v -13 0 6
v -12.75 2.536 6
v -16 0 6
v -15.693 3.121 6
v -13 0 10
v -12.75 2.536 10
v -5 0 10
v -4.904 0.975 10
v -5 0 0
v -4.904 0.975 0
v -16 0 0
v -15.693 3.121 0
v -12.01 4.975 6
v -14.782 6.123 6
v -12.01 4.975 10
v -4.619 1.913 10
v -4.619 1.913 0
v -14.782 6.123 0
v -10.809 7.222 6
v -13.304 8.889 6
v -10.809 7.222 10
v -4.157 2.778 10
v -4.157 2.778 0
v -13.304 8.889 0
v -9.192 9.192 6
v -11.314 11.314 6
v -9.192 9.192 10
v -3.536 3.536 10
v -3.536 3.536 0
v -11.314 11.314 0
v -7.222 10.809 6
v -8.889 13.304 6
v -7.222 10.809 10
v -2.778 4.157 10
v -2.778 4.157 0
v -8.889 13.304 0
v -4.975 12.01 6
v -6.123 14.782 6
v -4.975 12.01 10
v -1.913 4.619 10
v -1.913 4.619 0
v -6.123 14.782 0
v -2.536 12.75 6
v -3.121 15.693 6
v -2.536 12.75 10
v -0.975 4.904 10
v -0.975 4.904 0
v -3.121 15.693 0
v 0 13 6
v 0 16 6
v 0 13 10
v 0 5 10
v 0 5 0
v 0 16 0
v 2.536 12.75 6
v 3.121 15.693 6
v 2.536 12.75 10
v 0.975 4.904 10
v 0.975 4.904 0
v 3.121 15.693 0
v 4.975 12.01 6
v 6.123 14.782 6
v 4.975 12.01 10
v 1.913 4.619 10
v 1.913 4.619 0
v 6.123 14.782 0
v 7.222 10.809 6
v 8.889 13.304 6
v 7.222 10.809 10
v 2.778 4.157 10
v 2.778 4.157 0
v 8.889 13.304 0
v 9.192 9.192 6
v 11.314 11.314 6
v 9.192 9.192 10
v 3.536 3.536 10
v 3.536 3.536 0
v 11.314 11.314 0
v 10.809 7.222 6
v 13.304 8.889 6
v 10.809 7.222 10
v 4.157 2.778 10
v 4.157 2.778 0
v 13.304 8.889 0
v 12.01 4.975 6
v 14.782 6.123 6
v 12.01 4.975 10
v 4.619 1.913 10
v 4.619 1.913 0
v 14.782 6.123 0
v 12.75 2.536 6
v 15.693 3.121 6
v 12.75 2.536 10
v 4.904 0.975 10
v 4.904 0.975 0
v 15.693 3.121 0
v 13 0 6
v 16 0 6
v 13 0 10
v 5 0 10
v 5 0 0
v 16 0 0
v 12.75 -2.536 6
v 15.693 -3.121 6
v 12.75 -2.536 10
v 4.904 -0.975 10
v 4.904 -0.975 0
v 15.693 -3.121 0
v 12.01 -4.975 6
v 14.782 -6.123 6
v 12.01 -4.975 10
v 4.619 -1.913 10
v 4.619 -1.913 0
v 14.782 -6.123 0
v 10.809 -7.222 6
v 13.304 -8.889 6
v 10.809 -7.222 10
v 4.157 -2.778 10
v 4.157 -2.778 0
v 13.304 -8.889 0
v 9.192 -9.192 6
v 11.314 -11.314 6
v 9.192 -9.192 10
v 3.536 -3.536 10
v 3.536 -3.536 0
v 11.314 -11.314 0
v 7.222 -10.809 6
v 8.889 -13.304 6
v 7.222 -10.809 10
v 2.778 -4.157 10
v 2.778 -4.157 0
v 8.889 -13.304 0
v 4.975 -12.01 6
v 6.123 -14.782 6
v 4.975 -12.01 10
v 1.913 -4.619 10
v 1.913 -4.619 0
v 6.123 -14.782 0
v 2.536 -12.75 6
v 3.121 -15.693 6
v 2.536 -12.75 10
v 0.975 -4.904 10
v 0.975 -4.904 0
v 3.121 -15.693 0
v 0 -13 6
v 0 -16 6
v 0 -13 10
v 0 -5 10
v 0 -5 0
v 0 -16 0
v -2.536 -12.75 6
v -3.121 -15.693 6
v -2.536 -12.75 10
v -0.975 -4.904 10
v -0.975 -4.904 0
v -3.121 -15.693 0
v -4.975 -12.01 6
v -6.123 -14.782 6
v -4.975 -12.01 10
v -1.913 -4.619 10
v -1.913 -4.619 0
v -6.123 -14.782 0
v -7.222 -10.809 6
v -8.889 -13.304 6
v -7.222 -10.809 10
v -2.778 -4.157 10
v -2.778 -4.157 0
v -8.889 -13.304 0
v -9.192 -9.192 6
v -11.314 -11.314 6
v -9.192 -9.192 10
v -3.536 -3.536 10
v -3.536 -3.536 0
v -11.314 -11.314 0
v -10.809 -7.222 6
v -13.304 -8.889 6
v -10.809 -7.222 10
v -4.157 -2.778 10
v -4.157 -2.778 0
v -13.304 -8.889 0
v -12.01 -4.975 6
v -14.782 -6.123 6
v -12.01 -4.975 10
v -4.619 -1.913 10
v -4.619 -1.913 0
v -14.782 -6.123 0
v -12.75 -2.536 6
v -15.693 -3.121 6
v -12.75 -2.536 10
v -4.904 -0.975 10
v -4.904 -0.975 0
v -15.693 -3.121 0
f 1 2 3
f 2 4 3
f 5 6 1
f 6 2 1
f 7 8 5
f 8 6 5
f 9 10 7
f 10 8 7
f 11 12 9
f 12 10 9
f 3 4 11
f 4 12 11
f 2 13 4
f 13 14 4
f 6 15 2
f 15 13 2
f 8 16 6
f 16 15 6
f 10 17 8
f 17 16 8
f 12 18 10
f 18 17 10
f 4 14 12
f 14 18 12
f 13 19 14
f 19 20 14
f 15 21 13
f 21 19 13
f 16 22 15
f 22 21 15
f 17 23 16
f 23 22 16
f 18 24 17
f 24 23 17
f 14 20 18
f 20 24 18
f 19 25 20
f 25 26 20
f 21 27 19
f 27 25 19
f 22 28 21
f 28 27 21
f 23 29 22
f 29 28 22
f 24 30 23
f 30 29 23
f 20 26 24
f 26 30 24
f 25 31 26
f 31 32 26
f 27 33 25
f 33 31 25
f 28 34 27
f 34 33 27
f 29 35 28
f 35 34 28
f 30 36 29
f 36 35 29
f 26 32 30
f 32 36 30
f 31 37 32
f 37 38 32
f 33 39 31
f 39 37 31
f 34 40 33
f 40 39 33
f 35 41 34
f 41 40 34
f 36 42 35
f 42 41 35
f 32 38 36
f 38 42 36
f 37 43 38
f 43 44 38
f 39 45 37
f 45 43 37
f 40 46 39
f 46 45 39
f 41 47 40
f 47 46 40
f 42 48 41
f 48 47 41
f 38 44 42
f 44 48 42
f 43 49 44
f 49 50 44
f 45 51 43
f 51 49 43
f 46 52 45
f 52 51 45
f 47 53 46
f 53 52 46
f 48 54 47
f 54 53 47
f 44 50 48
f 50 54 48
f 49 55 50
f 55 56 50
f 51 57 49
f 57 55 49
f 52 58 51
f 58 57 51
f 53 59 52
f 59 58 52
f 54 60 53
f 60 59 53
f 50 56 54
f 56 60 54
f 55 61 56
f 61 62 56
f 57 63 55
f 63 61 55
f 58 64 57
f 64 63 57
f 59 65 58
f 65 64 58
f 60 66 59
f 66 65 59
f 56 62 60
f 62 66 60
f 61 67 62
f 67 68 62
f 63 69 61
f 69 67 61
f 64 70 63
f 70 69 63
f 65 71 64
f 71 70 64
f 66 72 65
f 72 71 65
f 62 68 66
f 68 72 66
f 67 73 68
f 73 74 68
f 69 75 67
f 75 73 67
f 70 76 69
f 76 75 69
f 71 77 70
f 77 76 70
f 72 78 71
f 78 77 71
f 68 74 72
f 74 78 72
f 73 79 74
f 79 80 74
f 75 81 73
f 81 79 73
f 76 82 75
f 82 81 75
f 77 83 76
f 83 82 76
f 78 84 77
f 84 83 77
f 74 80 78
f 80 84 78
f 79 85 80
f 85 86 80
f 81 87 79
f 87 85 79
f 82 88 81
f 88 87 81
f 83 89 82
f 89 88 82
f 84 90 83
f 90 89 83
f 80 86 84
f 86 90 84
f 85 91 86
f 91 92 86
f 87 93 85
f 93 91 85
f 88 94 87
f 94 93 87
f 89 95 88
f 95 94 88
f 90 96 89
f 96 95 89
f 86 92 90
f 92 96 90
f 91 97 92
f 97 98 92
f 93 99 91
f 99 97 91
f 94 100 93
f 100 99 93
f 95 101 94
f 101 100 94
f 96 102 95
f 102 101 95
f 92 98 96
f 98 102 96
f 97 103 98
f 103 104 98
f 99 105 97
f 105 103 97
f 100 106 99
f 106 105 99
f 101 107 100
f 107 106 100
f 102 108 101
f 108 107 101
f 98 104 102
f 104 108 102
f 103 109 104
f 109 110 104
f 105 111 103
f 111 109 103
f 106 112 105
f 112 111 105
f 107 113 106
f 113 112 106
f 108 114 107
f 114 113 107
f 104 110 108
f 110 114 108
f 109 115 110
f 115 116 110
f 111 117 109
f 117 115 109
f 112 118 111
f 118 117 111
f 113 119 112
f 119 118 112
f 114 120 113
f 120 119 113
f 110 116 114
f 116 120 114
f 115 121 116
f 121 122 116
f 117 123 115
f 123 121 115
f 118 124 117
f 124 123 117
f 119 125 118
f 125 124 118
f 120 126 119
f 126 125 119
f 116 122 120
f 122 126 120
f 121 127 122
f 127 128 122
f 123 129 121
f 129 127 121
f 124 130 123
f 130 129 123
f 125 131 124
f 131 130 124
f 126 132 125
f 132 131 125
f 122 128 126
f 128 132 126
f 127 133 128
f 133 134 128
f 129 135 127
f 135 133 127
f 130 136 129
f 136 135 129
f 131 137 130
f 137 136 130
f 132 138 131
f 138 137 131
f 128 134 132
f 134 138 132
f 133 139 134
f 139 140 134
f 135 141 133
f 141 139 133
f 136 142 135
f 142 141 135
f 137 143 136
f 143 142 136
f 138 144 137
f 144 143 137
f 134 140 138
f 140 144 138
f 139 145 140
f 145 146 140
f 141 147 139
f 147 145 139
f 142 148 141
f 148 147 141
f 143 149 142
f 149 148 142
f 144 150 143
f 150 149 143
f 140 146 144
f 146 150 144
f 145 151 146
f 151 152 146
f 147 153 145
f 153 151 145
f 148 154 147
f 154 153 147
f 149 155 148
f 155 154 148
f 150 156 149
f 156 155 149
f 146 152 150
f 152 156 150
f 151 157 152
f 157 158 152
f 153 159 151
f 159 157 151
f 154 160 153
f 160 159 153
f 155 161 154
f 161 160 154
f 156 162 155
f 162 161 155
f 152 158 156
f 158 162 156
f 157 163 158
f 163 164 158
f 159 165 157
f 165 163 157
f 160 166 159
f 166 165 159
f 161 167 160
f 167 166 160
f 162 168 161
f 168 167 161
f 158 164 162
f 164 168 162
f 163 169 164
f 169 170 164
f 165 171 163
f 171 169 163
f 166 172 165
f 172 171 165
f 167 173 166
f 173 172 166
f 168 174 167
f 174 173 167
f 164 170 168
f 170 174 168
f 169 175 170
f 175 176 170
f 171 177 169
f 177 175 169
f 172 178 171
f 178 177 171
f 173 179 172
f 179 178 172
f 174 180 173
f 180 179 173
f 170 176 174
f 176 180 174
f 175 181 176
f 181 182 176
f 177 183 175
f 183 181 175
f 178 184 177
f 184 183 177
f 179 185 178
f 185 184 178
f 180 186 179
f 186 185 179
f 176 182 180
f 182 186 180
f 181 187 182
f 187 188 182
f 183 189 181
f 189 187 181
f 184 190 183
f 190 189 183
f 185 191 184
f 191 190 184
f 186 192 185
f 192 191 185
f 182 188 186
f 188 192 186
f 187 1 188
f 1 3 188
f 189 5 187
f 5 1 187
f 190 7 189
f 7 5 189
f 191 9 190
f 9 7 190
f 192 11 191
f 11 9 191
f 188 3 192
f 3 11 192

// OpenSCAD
$fn = 32;

// ----------------------------------------------------------------------
// Arc stop: collar, 10 mm thick
// ----------------------------------------------------------------------

// --- parameters (mm) ---
revolve_angle = 360;      // full turn around the Z axis
profile_points = 6;       // points of the closed outline

profile = [[5, 0], [16, 0], [16, 6], [13, 6], [13, 10], [5, 10]];  // single closed polygon, 6 points, counter clockwise

// --- the one profile operation ---
rotate_extrude(angle = revolve_angle) polygon(points = profile);
